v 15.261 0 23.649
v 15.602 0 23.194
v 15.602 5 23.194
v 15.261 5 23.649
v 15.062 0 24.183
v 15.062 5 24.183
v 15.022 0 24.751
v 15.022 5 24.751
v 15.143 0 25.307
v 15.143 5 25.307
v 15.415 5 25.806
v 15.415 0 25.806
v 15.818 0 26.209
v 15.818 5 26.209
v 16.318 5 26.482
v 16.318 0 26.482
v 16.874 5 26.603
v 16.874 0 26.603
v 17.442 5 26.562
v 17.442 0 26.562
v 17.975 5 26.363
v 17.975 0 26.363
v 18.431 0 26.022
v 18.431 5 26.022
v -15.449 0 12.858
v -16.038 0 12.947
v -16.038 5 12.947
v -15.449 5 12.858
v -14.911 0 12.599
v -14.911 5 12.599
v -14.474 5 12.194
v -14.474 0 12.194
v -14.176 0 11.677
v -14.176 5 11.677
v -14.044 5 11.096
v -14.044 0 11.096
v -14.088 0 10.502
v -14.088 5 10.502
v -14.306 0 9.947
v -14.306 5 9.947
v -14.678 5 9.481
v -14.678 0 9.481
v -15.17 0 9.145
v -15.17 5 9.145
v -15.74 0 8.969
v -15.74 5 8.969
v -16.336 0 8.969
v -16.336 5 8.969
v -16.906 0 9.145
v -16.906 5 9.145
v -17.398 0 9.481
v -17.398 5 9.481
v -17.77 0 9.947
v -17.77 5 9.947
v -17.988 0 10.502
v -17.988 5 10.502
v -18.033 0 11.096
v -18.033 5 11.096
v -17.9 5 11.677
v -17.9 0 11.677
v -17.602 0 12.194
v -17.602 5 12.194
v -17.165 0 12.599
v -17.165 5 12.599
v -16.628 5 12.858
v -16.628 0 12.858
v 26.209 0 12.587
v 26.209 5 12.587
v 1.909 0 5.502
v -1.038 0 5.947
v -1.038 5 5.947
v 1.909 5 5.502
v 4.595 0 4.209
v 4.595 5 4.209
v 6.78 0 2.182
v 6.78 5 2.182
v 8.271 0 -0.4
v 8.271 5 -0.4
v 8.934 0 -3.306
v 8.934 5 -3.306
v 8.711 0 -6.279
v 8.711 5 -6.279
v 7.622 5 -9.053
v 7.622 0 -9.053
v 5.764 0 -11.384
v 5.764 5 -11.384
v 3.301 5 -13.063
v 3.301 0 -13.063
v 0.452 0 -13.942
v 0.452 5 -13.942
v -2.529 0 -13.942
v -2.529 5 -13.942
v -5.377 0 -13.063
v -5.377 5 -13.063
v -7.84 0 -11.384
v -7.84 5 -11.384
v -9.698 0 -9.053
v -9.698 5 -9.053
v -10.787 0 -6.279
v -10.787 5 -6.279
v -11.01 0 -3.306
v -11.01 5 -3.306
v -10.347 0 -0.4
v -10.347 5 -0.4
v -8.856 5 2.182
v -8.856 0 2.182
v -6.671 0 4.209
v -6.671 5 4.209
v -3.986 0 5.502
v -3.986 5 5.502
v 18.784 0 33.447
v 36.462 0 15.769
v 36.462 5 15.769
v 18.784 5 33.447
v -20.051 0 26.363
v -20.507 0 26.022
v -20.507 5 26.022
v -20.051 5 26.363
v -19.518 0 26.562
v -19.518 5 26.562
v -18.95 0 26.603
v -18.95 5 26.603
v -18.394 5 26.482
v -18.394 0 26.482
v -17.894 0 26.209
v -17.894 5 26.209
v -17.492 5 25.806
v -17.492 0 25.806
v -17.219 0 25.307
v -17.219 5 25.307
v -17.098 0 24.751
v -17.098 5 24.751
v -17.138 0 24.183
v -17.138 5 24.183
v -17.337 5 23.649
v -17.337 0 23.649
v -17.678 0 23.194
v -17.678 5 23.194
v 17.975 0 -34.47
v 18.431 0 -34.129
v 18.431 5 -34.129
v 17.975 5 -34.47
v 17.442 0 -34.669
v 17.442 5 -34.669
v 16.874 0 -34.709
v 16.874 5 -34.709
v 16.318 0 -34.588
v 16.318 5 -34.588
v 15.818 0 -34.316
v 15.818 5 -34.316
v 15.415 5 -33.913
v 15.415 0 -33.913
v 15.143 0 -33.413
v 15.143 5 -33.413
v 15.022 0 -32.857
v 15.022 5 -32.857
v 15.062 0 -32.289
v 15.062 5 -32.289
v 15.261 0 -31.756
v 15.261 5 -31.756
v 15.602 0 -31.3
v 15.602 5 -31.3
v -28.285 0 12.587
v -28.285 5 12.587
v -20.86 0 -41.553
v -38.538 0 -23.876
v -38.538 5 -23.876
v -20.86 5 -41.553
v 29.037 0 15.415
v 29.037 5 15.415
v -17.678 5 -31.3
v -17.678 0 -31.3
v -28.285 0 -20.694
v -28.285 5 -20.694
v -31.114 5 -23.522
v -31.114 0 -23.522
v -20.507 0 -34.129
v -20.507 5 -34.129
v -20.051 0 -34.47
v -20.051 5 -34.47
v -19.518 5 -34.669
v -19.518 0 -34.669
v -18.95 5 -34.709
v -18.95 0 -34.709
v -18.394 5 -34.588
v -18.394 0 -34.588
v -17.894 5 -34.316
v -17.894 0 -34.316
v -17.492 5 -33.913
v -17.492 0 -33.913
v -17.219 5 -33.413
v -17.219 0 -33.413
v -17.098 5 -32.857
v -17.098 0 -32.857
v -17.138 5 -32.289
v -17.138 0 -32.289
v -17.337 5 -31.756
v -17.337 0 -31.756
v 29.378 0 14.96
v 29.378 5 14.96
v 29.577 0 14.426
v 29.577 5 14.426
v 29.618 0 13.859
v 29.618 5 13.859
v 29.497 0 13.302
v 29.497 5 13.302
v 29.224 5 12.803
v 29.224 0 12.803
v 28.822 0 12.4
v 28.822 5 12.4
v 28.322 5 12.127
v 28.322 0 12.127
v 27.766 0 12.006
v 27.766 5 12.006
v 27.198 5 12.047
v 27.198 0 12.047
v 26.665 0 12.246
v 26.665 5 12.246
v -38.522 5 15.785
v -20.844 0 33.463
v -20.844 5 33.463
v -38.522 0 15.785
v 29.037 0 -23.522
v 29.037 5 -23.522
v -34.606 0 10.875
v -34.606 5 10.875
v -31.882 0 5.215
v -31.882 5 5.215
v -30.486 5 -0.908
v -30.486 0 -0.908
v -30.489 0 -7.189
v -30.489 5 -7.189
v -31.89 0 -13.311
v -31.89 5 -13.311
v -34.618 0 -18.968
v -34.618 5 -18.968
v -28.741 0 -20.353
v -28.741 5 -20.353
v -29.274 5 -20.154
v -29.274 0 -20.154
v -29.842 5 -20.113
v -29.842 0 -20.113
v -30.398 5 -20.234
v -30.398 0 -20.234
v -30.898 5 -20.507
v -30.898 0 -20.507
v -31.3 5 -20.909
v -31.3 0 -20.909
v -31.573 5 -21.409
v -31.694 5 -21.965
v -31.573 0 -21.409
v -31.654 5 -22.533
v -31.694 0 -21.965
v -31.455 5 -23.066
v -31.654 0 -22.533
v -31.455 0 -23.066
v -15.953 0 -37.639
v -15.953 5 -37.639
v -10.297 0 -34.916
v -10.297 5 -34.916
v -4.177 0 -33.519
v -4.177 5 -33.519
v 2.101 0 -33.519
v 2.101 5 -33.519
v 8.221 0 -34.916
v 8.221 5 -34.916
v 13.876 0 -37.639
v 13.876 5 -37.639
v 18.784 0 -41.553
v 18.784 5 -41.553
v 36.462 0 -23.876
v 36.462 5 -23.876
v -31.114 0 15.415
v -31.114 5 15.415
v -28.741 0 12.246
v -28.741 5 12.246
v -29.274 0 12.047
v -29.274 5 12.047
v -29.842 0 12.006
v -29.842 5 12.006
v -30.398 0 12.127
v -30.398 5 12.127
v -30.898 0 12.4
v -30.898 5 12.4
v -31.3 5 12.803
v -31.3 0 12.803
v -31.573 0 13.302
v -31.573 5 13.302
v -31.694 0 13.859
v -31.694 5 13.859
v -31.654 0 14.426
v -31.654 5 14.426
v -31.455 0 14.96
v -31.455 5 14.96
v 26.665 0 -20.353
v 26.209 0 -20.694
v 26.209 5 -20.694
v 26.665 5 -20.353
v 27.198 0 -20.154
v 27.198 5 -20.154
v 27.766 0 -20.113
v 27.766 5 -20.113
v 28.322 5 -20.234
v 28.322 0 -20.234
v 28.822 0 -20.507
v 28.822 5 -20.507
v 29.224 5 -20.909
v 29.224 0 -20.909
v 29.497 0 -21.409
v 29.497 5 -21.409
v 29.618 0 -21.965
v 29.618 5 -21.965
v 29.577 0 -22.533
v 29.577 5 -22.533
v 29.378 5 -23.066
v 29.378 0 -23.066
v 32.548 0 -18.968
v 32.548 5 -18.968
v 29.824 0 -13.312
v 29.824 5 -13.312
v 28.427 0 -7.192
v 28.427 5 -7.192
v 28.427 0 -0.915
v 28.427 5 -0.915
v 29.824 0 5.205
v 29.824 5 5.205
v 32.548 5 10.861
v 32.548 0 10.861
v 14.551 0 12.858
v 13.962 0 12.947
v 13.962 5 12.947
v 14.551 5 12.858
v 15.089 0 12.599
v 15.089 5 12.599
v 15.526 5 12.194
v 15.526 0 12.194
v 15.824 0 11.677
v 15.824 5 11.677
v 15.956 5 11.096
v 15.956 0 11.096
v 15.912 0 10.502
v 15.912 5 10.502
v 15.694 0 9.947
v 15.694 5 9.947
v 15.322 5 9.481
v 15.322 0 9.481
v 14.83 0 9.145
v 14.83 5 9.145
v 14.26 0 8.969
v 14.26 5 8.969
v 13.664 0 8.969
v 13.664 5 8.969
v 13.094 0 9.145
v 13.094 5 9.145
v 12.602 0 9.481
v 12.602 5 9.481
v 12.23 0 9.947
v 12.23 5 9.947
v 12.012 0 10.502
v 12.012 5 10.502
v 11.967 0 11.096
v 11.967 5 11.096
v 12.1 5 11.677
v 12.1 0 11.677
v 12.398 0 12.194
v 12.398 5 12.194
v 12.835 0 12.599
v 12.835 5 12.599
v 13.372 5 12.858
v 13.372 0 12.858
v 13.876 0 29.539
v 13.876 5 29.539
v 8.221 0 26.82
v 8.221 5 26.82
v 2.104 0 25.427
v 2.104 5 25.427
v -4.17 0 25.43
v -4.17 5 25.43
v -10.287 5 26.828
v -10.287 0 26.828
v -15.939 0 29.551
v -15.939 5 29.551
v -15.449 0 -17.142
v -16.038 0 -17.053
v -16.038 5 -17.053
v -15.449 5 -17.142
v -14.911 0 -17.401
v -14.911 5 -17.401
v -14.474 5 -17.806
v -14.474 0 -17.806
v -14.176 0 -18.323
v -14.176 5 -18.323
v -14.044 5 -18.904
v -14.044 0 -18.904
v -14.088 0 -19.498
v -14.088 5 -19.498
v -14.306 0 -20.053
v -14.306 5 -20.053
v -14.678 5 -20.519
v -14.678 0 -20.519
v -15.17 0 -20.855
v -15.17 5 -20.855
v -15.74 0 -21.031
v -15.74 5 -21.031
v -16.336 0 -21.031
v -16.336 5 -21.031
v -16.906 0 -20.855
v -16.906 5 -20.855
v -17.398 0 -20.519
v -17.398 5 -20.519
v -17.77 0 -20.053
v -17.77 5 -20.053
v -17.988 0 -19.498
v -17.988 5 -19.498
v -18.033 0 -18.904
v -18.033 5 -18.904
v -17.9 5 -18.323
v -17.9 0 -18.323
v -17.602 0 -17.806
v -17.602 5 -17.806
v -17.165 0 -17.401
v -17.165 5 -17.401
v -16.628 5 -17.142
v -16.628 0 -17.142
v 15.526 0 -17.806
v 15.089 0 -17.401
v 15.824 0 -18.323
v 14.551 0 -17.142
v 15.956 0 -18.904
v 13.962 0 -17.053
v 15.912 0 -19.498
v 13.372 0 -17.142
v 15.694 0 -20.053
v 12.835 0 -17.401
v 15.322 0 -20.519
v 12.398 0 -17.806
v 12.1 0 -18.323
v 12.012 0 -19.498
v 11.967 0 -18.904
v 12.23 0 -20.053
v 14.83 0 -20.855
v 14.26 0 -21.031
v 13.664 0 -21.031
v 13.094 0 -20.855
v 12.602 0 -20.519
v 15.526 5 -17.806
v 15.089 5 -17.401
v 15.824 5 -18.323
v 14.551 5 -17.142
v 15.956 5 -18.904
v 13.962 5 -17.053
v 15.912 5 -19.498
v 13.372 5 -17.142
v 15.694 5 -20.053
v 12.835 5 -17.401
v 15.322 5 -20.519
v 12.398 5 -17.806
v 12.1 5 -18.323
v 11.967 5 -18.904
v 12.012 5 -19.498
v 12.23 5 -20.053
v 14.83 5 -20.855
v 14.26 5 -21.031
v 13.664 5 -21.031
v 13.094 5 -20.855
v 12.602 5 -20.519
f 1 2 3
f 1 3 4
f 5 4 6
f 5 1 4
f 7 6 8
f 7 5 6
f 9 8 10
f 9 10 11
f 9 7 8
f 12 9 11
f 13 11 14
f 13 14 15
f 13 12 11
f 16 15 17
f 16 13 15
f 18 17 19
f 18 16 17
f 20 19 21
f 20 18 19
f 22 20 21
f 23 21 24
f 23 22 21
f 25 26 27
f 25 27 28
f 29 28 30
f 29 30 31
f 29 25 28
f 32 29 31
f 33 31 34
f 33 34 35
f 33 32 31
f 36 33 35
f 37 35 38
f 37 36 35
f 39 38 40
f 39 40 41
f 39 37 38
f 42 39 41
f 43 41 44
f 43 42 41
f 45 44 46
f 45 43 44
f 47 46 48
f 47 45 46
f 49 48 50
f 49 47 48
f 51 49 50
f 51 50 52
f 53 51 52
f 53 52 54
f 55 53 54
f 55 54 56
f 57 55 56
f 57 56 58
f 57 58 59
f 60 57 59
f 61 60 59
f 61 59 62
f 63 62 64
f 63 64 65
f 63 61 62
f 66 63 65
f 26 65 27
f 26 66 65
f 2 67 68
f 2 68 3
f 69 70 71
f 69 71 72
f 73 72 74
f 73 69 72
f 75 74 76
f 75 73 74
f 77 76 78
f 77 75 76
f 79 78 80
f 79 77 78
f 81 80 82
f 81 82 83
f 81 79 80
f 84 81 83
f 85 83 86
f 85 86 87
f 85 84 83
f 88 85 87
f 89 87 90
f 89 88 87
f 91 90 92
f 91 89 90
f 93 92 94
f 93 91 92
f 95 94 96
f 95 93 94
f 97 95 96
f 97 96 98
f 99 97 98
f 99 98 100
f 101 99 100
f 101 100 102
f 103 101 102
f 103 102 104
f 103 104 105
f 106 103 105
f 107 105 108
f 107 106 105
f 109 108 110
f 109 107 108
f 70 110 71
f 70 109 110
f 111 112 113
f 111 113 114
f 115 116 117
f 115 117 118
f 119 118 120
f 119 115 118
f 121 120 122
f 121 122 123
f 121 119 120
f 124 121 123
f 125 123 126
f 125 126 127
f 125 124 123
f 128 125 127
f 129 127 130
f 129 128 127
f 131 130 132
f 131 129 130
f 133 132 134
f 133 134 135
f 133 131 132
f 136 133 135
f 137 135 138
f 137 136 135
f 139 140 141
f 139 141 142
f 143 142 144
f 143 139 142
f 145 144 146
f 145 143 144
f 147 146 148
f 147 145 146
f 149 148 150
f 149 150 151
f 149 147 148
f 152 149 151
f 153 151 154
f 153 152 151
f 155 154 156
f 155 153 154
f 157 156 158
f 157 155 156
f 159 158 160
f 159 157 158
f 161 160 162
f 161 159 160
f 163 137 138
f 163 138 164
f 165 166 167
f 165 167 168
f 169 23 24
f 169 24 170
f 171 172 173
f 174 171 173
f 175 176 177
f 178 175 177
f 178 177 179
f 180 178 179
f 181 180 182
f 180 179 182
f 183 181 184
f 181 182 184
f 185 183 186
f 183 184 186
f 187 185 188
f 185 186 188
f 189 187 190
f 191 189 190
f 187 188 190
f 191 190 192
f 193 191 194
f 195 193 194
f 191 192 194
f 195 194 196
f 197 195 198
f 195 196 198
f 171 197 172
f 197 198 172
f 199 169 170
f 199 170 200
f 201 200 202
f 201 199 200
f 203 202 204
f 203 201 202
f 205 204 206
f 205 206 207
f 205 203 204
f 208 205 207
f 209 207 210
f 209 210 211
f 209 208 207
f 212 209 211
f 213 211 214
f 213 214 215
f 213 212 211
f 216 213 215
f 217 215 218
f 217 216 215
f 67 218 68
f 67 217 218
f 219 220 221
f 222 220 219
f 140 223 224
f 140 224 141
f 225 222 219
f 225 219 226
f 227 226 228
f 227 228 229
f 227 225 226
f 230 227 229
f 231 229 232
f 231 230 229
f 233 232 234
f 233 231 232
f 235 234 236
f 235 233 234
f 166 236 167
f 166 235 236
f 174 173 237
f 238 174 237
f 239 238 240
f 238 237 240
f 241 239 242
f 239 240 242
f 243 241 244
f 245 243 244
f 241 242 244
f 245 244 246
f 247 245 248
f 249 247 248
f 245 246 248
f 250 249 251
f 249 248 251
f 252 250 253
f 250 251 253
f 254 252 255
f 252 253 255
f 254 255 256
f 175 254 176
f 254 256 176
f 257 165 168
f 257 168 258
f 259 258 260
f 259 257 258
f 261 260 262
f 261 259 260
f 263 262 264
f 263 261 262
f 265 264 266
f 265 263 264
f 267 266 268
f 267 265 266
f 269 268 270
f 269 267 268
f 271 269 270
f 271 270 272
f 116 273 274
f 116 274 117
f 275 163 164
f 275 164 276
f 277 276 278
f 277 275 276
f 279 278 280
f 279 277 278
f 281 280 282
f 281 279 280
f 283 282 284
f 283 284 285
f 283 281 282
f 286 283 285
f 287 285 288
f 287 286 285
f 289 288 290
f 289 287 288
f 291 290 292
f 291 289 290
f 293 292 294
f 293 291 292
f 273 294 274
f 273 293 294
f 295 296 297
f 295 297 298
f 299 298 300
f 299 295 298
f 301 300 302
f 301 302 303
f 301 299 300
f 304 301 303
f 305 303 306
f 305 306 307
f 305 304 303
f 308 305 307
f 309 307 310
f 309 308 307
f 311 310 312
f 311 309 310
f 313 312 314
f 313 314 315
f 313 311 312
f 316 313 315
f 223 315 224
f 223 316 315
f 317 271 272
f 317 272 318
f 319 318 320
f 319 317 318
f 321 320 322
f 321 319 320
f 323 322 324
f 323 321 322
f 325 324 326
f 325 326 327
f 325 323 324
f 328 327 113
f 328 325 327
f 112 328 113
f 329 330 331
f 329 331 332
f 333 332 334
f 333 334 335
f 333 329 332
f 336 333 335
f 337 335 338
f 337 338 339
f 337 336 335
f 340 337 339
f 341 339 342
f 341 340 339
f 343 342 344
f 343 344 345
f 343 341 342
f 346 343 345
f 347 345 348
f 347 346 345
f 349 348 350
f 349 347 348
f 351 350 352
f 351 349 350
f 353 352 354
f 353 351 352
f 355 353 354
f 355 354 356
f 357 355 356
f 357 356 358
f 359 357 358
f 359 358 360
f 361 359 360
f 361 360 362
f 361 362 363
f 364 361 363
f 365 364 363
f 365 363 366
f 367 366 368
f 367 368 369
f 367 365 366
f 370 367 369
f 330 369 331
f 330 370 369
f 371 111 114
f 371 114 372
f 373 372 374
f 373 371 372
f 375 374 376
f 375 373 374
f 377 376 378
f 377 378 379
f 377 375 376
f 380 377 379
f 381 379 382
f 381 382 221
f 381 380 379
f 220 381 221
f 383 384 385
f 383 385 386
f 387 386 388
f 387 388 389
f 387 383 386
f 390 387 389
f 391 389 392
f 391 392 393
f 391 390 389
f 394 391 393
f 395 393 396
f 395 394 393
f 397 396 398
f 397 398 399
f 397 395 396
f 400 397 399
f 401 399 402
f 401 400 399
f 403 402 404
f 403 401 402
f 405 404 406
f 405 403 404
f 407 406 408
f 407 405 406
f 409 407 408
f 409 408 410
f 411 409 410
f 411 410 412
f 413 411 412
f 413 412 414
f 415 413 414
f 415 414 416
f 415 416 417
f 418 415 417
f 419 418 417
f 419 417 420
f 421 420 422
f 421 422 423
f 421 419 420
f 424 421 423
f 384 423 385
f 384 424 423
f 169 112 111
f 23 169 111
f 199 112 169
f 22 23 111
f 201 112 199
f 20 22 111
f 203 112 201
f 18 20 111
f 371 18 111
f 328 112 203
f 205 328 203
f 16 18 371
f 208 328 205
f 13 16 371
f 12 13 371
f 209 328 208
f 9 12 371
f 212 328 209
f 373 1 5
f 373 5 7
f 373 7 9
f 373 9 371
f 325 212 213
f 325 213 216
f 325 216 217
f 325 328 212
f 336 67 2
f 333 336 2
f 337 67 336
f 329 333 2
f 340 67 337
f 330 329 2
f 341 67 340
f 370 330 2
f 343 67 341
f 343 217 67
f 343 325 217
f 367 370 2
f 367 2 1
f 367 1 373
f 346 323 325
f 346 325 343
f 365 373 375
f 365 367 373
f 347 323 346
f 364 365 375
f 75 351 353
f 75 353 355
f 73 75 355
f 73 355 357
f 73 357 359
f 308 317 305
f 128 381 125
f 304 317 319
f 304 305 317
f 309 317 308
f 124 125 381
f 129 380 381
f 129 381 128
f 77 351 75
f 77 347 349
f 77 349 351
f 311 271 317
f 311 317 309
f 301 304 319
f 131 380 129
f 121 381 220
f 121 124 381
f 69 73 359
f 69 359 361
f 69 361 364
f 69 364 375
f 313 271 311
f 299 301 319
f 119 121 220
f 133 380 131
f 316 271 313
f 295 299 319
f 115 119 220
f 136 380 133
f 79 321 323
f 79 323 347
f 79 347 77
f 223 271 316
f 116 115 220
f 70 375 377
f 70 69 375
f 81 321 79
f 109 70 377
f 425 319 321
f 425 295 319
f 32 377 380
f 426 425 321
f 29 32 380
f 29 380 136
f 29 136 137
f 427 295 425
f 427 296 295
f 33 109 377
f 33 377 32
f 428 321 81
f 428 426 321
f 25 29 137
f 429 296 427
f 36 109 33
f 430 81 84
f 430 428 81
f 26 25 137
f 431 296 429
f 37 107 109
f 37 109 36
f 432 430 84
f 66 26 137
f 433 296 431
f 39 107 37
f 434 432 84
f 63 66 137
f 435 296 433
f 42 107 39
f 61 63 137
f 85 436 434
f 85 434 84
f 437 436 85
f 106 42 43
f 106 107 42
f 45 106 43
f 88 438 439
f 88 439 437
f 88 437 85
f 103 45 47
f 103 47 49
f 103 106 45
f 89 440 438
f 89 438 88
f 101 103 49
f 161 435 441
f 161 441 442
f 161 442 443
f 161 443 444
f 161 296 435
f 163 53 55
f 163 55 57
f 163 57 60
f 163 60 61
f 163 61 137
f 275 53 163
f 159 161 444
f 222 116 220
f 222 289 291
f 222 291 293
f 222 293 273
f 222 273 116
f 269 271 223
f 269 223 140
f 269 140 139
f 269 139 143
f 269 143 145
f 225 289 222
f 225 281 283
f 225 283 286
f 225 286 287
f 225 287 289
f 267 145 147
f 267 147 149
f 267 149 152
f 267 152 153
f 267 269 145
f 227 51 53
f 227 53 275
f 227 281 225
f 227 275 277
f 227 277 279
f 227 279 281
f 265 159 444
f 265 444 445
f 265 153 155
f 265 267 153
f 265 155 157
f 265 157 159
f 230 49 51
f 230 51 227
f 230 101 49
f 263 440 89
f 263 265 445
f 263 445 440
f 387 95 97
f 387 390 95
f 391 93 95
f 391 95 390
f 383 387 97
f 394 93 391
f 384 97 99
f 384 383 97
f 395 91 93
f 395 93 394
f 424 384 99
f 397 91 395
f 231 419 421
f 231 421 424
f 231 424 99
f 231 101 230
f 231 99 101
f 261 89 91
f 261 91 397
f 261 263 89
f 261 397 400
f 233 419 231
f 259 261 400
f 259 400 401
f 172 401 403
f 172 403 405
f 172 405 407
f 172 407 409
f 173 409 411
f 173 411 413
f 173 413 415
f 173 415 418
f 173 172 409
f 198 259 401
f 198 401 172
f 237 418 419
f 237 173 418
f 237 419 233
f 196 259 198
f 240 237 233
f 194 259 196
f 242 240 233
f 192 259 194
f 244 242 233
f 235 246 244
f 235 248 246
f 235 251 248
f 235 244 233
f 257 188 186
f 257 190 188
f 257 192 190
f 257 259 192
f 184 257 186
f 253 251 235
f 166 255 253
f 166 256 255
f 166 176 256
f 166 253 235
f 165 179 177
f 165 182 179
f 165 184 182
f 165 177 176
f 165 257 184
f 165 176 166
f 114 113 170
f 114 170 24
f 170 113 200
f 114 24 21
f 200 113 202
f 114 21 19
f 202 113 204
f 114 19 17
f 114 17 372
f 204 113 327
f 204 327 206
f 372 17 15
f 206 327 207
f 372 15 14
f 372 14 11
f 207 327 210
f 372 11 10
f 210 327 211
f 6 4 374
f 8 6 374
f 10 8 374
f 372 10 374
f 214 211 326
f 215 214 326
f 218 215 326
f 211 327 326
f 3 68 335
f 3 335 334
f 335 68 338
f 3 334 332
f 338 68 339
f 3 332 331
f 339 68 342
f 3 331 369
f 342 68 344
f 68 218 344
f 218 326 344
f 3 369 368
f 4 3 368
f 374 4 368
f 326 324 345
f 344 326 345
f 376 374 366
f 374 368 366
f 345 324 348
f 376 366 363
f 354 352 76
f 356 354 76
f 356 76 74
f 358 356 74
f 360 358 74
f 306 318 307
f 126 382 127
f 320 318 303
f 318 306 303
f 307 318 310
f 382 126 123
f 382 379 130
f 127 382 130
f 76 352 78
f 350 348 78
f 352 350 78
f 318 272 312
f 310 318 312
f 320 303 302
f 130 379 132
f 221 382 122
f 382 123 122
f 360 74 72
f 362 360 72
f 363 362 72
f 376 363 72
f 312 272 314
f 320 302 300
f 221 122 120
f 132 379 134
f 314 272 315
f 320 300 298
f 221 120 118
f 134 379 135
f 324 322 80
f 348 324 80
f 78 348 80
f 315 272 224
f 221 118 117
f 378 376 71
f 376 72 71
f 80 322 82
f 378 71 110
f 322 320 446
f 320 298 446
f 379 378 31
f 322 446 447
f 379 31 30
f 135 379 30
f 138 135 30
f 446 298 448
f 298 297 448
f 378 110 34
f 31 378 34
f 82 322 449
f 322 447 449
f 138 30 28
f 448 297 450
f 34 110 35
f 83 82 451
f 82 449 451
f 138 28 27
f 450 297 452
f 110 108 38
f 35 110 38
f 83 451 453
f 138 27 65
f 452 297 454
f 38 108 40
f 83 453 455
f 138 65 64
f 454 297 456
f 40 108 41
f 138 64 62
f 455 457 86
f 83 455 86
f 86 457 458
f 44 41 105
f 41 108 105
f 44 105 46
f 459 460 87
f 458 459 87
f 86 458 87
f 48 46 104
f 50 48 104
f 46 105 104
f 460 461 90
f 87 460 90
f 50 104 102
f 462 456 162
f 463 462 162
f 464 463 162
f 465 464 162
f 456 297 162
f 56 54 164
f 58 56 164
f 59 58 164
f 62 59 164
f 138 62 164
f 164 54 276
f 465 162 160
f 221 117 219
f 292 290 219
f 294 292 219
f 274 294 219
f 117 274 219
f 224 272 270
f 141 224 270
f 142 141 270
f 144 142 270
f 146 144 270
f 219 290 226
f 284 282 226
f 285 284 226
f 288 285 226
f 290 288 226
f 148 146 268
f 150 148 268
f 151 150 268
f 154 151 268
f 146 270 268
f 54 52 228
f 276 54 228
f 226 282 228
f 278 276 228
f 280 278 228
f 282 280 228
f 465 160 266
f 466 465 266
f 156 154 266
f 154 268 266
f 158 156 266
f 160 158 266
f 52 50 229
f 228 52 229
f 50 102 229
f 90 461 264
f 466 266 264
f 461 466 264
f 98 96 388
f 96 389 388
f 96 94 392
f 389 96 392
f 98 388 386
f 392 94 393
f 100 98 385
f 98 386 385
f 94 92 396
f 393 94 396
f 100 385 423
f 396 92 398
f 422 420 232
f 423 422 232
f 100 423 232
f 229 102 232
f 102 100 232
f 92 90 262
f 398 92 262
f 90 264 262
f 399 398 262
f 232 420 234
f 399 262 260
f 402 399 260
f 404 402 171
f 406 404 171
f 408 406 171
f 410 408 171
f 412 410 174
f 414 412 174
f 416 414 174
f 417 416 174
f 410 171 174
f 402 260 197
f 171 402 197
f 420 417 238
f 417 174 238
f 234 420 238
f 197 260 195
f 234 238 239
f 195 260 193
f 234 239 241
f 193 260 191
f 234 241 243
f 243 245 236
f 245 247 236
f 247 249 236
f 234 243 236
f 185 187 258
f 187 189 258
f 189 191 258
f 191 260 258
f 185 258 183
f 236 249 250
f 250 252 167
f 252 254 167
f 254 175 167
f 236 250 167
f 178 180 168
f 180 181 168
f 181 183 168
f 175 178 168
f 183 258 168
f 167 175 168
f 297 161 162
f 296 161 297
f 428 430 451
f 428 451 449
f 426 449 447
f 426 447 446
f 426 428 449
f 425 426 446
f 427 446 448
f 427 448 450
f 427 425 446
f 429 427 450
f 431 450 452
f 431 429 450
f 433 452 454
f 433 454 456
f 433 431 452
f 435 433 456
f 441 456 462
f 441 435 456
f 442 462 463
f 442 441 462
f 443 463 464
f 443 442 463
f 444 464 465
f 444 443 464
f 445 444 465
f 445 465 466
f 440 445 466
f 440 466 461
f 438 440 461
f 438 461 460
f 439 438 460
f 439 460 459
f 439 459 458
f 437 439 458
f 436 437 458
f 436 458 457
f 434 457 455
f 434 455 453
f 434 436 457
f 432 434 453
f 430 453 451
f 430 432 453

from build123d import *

# Parameters (mm, degrees)
SKETCH2_R           = 10
SKETCH2_R_2         = 2
BOSS_EXTRUDE1_DEPTH = 5


with BuildPart() as part:
    # Sketch2 → Boss-Extrude1 (new body)
    with BuildSketch(Plane(origin=(0, 0, 0), x_dir=(1, 0, 0), z_dir=(0, 1, 0))):
        with BuildLine():
            Line((18.784202094, 41.553321118), (36.461871623, 23.875651588))
            ThreePointArc((36.461871623, 23.875651588), (28.251193505, 4.053321118), (36.461871623, -15.769009352))
            Line((36.461871623, -15.769009352), (18.784202094, -33.446678882))
            ThreePointArc((18.784202094, -33.446678882), (-1.033353761, -25.252275183), (-20.844173422, -33.462950938))
            Line((-20.844173422, -33.462950938), (-38.521842951, -15.785281409))
            ThreePointArc((-38.521842951, -15.785281409), (-30.311167196, 4.048559871), (-38.538128377, 23.875651588))
            Line((-38.538128377, 23.875651588), (-20.860458847, 41.553321118))
            ThreePointArc((-20.860458847, 41.553321118), (-1.038128377, 33.342642999), (18.784202094, 41.553321118))
        make_face()
        with Locations(Location((-1.038128377, 4.053321118, 0), (0, 0, 270))):
            Circle(SKETCH2_R, mode=Mode.SUBTRACT)
        with Locations(Location((-16.038128377, 19.053321118, 0), (0, 0, 270))):
            Circle(SKETCH2_R_2, mode=Mode.SUBTRACT)
        with Locations(Location((13.961871623, 19.053321118, 0), (0, 0, 270))):
            Circle(SKETCH2_R_2, mode=Mode.SUBTRACT)
        with Locations(Location((13.961871623, -10.946678882, 0), (0, 0, 270))):
            Circle(SKETCH2_R_2, mode=Mode.SUBTRACT)
        with Locations(Location((-16.038128377, -10.946678882, 0), (0, 0, 270))):
            Circle(SKETCH2_R_2, mode=Mode.SUBTRACT)
        with BuildLine():
            Line((-17.678478332, 31.300272791), (-28.28508005, 20.693671073))
            ThreePointArc((-28.28508005, 20.693671073), (-31.113507174, 20.693671073), (-31.113507174, 23.522098198))
            Line((-31.113507174, 23.522098198), (-20.506905456, 34.128699916))
            ThreePointArc((-20.506905456, 34.128699916), (-17.678478332, 34.128699916), (-17.678478332, 31.300272791))
        make_face(mode=Mode.SUBTRACT)
        with BuildLine():
            Line((29.037250421, 23.522098198), (18.430648703, 34.128699916))
            ThreePointArc((18.430648703, 34.128699916), (15.602221578, 34.128699916), (15.602221578, 31.300272791))
            Line((15.602221578, 31.300272791), (26.208823296, 20.693671073))
            ThreePointArc((26.208823296, 20.693671073), (29.037250421, 20.693671073), (29.037250421, 23.522098198))
        make_face(mode=Mode.SUBTRACT)
        with BuildLine():
            Line((18.430648703, -26.022057679), (29.037250421, -15.415455962))
            ThreePointArc((29.037250421, -15.415455962), (29.037250421, -12.587028837), (26.208823296, -12.587028837))
            Line((26.208823296, -12.587028837), (15.602221578, -23.193630555))
            ThreePointArc((15.602221578, -23.193630555), (15.602221578, -26.022057679), (18.430648703, -26.022057679))
        make_face(mode=Mode.SUBTRACT)
        with BuildLine():
            Line((-31.113507174, -15.415455962), (-20.506905456, -26.022057679))
            ThreePointArc((-20.506905456, -26.022057679), (-17.678478332, -26.022057679), (-17.678478332, -23.193630555))
            Line((-17.678478332, -23.193630555), (-28.28508005, -12.587028837))
            ThreePointArc((-28.28508005, -12.587028837), (-31.113507174, -12.587028837), (-31.113507174, -15.415455962))
        make_face(mode=Mode.SUBTRACT)
    extrude(amount=BOSS_EXTRUDE1_DEPTH)


solid = part.part
